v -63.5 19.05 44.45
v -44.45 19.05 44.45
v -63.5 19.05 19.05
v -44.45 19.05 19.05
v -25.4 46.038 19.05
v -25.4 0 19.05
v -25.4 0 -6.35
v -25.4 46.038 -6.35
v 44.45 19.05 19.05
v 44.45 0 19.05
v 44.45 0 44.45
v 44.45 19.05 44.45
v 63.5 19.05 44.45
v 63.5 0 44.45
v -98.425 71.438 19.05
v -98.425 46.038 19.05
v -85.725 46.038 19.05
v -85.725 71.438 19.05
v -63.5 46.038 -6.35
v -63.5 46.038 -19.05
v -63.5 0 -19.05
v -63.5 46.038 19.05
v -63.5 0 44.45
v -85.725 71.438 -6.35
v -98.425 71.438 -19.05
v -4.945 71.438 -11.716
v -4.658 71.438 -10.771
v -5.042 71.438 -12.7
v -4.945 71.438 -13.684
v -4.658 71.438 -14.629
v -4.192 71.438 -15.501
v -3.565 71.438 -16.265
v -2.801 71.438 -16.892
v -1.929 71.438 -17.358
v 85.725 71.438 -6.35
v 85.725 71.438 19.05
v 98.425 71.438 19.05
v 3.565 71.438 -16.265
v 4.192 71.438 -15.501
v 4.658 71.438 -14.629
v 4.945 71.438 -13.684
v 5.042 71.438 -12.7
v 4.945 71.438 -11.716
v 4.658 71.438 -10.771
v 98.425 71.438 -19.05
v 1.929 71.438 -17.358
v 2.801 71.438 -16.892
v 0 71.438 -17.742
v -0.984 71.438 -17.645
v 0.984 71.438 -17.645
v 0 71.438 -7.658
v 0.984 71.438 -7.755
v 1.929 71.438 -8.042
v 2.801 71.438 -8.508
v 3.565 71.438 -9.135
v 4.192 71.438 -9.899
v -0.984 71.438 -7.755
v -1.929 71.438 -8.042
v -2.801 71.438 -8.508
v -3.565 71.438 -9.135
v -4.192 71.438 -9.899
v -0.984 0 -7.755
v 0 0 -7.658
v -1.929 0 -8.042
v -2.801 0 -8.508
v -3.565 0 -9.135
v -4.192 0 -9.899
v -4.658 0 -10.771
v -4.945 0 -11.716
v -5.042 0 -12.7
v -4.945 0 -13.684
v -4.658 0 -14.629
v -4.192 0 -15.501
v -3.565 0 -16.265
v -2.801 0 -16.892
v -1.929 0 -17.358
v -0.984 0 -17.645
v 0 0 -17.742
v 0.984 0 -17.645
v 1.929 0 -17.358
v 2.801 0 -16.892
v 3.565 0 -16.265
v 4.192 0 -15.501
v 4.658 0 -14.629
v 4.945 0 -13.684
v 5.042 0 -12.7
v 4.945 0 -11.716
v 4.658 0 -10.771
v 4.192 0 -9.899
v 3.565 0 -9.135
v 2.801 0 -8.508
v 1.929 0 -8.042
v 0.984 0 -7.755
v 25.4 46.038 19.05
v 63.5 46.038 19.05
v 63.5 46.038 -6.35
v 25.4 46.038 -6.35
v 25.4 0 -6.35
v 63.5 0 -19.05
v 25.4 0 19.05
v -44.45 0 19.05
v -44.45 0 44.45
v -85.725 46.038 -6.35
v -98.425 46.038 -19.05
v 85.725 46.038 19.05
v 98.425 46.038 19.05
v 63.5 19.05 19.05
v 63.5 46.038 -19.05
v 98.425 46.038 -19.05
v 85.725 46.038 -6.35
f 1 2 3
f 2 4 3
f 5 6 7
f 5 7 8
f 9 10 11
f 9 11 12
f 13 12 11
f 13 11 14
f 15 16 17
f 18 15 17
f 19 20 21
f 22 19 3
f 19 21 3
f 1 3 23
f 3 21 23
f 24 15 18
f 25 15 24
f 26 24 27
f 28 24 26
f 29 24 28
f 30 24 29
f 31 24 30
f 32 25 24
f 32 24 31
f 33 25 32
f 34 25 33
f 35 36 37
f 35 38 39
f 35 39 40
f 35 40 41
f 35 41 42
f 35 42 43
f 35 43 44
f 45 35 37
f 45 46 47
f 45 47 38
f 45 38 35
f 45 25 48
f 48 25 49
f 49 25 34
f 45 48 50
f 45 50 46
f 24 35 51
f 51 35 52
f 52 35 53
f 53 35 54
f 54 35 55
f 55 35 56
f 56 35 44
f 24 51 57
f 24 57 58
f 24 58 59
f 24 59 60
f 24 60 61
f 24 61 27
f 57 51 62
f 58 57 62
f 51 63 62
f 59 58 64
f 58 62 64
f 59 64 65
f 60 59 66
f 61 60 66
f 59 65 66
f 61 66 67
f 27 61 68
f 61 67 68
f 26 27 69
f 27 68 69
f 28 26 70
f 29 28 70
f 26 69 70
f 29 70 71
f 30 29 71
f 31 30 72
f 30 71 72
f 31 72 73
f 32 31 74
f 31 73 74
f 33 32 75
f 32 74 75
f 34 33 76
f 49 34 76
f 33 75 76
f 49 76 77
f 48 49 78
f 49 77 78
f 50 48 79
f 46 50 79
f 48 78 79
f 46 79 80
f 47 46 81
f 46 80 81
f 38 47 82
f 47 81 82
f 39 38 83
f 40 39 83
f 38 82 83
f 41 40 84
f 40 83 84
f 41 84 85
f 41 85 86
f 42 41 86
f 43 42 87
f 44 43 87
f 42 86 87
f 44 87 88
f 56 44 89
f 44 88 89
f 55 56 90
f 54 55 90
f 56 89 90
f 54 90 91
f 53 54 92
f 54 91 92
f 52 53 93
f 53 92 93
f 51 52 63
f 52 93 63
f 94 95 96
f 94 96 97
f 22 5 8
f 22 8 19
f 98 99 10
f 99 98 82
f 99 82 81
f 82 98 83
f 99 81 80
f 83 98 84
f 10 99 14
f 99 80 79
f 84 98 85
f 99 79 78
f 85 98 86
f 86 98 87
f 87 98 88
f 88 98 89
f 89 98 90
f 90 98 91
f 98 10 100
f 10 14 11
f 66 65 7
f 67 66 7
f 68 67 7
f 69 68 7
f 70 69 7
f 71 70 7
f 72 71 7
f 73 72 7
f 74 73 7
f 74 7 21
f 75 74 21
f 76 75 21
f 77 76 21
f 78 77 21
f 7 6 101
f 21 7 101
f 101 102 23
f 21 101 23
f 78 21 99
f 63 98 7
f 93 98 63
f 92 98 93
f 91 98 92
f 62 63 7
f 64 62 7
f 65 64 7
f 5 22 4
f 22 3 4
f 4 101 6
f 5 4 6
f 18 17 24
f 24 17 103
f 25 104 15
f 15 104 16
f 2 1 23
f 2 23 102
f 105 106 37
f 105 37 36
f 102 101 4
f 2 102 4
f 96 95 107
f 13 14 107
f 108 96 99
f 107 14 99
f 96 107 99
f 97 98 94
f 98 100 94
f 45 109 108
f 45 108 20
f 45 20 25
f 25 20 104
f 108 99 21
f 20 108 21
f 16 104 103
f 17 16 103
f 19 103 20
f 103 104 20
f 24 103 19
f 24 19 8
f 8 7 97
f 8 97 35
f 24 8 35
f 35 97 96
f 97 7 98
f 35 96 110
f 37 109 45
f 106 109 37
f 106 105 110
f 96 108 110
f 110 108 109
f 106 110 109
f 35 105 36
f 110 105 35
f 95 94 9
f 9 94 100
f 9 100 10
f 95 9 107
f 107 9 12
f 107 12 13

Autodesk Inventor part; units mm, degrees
ref_plane "YZ Plane" through (0, 0, 0) normal (1, 0, 0) x (0, 1, 0)
ref_plane "XZ Plane" through (0, 0, 0) normal (0, 1, 0) x (-1, 0, 0)
ref_plane "XY Plane" through (0, 0, 0) normal (0, 0, 1) x (1, 0, 0)
sketch "Sketch1" plane through (0, 0, 0) normal (0, 1, 0) x (-1, 0, 0)
  line L0 (63.5, 19.05) -> (-63.5, 19.05)
  line L1 (-63.5, 19.05) -> (-63.5, -19.05)
  line L2 (-63.5, -19.05) -> (63.5, -19.05)
  line L3 (63.5, -19.05) -> (63.5, 19.05)
  line L4 (63.5, 19.05) -> (-63.5, -19.05) construction
  line L5 (-63.5, 19.05) -> (63.5, -19.05) construction
  point P0 (0, 0)
  dimension "baseLength" = 127
  dimension "width" = 38.1
extrude "Extrusion1" add sketch "Sketch1" along normal blind 46.0375
sketch "Sketch6" plane through (0, 46.0375, 0) normal (0, 1, 0) x (1, 0, 0)
  line L0 (0, 19.05) -> (-98.425, 19.05)
  line L1 (-98.425, 19.05) -> (-98.425, -19.05)
  line L2 (-98.425, -19.05) -> (-85.725, -19.05)
  line L3 (-85.725, -19.05) -> (-85.725, 6.35)
  line L4 (-85.725, 6.35) -> (0, 6.35)
  line L5 (0, 19.05) -> (0, 6.35) construction
  line L6 (0, 19.05) -> (98.425, 19.05)
  line L7 (98.425, 19.05) -> (98.425, -19.05)
  line L8 (98.425, -19.05) -> (85.725, -19.05)
  line L9 (85.725, -19.05) -> (85.725, 6.35)
  line L10 (85.725, 6.35) -> (0, 6.35)
  line L11 (63.5, 19.05) -> (-63.5, 19.05) construction
  line L12 (-63.5, 19.05) -> (63.5, 19.05) construction
  point P0 (0, 0)
  dimension "d29" = 98.425
  dimension "d30" = 38.1
  dimension "d31" = 12.7
  dimension "interiorWidthForBattery" = 25.4
extrude "Extrusion4" add sketch "Sketch6" along normal blind 25.4
sketch "Sketch7" plane through (-63.5, 0, 19.05) normal (0, 0, 1) x (1, 0, 0)
  line L0 (63.5, 0) -> (63.5, 46.0375) construction
  line L1 (0, 46.0375) -> (127, 46.0375) construction
  line L2 (0, 0) -> (0, 46.0375) projected
  line L3 (0, 0) -> (19.05, 0)
  line L4 (19.05, 0) -> (19.05, 19.05)
  line L5 (19.05, 19.05) -> (0, 19.05)
  line L6 (0, 19.05) -> (0, 0)
  line L7 (127, 0) -> (107.95, 0)
  line L8 (107.95, 0) -> (107.95, 19.05)
  line L9 (107.95, 19.05) -> (127, 19.05)
  line L10 (127, 19.05) -> (127, 0)
  dimension "d35" = 19.05
  dimension "d47" = 19.05
  dimension "d48" = 19.05
  dimension "d49" = 19.05
extrude "Extrusion5" add sketch "Sketch7" along normal blind 25.4
sketch "Sketch8" plane through (0, 71.4375, 0) normal (0, 1, 0) x (1, 0, 0)
  line L0 (98.425, 19.05) -> (-98.425, 19.05) projected
  point P0 (0, 0)
  point P1 (0, 12.7)
  dimension "d39" = 6.35
hole "Hole2" at (0, 71.4375, -12.7) direction (0, -1, 0) diameter 10.0838 end through all clearance for "Flat Head Machine Screw (82)" size "3/8" standard "Ansi Unified Screw Threads"
sketch "Sketch9" plane through (-63.5, 46.0375, 19.05) normal (0, 0, 1) x (1, 0, 0)
  line L0 (0, 0) -> (127, 0) construction
  line L1 (63.5, -46.0375) -> (38.1, -46.0375)
  line L2 (38.1, -46.0375) -> (38.1, 0)
  line L3 (38.1, 0) -> (63.5, 0)
  line L4 (63.5, -46.0375) -> (63.5, 0) construction
  line L5 (19.05, -46.0375) -> (107.95, -46.0375) construction
  line L6 (127, 0) -> (0, 0) construction
  line L7 (127, 0) -> (0, 0) construction
  line L8 (63.5, -46.0375) -> (88.9, -46.0375)
  line L9 (88.9, -46.0375) -> (88.9, 0)
  line L10 (88.9, 0) -> (63.5, 0)
extrude "Extrusion6" cut sketch "Sketch9" against normal blind 25.4
equation "\"d29\" = batterySupportWall + 0.5 * widthForBattery"
equation "\"d30\" = exteriorWidthForBattery"
equation "\"d31\" = batterySupportWall"
equation "\"widthForBattery\" = 171.45"
equation "\"sideLenghtForBattery\" = 25.4"
equation "\"exteriorWidthForBattery\" = 38.1"
equation "\"batterySupportWall\" = 12.7"
properties part number "BatteryHolder"
